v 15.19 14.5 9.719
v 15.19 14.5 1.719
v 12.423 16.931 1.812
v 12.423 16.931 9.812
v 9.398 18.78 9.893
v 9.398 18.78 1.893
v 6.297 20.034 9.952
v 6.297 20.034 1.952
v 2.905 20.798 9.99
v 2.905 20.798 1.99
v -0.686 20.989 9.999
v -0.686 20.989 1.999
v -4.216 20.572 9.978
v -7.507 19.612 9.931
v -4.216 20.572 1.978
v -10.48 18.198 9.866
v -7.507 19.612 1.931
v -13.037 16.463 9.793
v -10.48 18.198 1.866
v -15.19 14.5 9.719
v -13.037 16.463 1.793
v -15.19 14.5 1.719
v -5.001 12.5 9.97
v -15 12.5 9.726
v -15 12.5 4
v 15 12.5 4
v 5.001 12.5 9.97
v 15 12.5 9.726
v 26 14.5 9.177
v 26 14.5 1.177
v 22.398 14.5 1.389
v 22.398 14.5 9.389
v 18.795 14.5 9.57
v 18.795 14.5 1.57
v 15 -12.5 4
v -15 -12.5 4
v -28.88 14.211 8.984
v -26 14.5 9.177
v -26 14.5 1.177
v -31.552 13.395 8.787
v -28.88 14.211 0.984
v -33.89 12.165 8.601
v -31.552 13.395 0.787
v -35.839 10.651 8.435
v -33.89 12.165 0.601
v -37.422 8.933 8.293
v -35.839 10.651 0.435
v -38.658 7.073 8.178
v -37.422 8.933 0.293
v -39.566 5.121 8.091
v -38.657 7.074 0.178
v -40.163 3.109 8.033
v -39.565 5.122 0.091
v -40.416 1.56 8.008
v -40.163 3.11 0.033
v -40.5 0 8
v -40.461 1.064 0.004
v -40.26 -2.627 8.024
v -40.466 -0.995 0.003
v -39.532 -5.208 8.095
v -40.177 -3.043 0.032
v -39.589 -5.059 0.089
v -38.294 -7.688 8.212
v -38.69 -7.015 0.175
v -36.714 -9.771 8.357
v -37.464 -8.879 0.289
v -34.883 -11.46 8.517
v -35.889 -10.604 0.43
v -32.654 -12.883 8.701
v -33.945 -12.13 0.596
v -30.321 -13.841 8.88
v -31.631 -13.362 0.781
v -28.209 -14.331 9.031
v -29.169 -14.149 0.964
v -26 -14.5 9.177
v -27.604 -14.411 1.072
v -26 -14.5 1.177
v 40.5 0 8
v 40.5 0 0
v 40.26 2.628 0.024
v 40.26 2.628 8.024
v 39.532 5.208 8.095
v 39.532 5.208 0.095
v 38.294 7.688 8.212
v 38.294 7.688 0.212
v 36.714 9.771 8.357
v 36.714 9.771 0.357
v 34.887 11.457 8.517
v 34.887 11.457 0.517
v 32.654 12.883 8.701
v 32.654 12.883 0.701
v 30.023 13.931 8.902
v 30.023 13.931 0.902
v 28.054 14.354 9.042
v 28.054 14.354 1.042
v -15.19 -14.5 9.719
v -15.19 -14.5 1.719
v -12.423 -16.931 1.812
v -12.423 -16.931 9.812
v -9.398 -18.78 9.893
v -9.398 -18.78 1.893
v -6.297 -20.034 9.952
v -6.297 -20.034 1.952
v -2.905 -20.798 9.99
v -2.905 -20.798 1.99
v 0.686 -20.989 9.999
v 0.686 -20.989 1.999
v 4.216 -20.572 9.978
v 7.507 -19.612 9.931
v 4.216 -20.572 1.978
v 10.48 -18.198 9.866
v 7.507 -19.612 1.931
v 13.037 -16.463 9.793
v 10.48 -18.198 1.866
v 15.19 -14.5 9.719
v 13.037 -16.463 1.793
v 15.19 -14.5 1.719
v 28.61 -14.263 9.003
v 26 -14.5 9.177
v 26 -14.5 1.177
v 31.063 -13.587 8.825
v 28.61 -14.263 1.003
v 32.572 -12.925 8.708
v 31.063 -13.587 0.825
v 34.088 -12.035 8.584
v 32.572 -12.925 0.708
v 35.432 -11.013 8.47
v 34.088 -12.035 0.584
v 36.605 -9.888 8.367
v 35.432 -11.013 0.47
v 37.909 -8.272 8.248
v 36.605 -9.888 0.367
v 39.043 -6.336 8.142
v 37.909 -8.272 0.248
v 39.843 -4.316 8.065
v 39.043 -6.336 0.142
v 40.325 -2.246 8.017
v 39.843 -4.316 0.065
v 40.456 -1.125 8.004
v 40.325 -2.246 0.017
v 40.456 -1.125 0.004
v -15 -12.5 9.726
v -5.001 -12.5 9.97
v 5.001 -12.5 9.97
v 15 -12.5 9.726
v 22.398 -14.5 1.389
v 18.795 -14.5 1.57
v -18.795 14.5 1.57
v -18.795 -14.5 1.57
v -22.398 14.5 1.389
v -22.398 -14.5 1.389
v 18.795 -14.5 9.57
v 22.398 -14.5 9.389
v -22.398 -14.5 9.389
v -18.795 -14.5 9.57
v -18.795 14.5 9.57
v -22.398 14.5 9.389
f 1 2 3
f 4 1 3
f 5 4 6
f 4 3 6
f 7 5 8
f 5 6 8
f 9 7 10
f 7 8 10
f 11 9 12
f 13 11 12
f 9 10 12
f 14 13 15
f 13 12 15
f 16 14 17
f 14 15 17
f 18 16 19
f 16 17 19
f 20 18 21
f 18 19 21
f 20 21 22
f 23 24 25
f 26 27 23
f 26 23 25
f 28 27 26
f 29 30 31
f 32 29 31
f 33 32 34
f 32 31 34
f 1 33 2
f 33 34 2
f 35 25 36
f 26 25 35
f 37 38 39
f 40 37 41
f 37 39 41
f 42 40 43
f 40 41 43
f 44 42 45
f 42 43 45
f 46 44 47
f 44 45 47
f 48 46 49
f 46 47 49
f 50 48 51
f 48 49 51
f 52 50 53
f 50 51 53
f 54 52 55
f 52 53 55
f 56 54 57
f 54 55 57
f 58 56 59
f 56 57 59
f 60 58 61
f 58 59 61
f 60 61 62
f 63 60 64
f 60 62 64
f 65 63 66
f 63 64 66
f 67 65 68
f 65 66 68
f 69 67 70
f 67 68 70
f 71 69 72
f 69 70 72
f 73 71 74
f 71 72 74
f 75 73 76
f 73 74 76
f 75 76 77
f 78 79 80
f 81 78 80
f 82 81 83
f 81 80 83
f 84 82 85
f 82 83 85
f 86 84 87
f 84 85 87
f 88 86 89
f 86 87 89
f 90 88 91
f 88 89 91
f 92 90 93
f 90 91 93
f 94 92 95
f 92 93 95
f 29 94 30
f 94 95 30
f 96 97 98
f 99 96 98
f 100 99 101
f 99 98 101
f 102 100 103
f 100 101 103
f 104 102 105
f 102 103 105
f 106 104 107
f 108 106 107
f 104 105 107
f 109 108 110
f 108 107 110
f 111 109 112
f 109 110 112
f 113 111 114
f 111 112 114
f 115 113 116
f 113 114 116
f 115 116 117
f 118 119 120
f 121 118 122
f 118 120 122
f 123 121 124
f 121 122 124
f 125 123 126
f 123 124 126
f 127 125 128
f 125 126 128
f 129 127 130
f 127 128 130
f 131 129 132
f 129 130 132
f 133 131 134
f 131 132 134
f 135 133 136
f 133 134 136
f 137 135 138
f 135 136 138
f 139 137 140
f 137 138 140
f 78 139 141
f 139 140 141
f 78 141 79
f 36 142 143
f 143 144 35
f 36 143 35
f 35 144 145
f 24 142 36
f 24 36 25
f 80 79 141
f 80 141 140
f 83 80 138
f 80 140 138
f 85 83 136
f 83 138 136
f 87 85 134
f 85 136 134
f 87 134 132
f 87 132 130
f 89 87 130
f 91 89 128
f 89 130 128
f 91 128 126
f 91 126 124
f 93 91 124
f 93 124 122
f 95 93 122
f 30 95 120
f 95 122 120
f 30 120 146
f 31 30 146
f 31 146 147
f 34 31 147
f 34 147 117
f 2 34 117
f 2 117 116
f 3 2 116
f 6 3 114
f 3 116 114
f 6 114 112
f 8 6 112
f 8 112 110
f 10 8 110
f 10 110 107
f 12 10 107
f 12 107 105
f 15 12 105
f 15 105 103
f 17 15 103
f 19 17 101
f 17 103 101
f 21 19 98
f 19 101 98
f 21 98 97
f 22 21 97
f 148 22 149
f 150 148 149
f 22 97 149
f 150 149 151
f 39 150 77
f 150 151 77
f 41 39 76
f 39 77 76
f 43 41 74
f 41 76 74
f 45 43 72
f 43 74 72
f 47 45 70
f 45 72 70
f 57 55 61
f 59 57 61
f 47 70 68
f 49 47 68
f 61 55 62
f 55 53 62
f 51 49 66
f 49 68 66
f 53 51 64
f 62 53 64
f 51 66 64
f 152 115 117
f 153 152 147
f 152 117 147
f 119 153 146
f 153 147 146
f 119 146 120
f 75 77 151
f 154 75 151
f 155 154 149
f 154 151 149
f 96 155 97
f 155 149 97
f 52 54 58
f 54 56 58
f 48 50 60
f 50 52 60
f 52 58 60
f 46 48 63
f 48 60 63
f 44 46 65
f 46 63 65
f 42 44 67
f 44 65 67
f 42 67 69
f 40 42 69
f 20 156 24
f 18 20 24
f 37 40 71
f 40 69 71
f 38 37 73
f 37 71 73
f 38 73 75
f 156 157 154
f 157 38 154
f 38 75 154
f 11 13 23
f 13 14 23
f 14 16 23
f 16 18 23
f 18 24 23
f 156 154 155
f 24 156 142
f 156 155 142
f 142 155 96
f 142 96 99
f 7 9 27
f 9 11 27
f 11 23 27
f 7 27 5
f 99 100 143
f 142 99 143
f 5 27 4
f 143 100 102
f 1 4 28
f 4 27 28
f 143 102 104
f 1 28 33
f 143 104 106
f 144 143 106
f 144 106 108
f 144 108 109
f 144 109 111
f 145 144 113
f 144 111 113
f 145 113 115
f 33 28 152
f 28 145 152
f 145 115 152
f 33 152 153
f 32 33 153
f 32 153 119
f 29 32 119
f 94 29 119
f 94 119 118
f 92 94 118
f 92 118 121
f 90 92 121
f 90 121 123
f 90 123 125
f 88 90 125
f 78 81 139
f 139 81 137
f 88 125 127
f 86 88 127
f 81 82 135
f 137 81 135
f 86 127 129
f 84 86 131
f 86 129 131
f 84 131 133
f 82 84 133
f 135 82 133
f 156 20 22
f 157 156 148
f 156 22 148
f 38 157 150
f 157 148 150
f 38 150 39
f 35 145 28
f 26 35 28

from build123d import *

# Parameters (mm, degrees)
F1_DEPTH = 10
F3_R     = 411.0625
F4_DEPTH = 50
F2_W     = 30
F2_H     = 25
F5_DEPTH = 6
F7_DEPTH = 50


with BuildPart() as f1:
    # F0 (on Top) → F1 (new body)
    with BuildSketch(Plane.XY):
        with BuildLine():
            ThreePointArc((17.4375, 11.7018628325), (16.3738601454, 13.1490191245), (15.190457531, 14.5))
            ThreePointArc((15.190457531, 14.5), (0, 21), (-15.190457531, 14.5))
            ThreePointArc((-15.190457531, 14.5), (-16.3738601454, 13.1490191245), (-17.4375, 11.7018628325))
            ThreePointArc((-17.4375, 11.7018628325), (-13.0692952628, 6.561011736), (-11.5, 0))
            ThreePointArc((-11.5, 0), (-13.0692952628, -6.561011736), (-17.4375, -11.7018628325))
            ThreePointArc((-17.4375, -11.7018628325), (-16.3738601454, -13.1490191245), (-15.190457531, -14.5))
            ThreePointArc((-15.190457531, -14.5), (0, -21), (15.190457531, -14.5))
            ThreePointArc((15.190457531, -14.5), (16.3738601454, -13.1490191245), (17.4375, -11.7018628325))
            ThreePointArc((17.4375, -11.7018628325), (11.5, 0), (17.4375, 11.7018628325))
        make_face()
        with BuildLine():
            Line((26, 14.5), (15.190457531, 14.5))
            ThreePointArc((15.190457531, 14.5), (16.3738601454, 13.1490191245), (17.4375, 11.7018628325))
            ThreePointArc((17.4375, 11.7018628325), (21.4959468848, 13.7827248952), (26, 14.5))
        make_face()
        with BuildLine():
            ThreePointArc((-17.4375, 11.7018628325), (-16.3738601454, 13.1490191245), (-15.190457531, 14.5))
            Line((-15.190457531, 14.5), (-26, 14.5))
            ThreePointArc((-26, 14.5), (-21.4959468848, 13.7827248952), (-17.4375, 11.7018628325))
        make_face()
        with BuildLine():
            ThreePointArc((26, 14.5), (21.4959468848, 13.7827248952), (17.4375, 11.7018628325))
            ThreePointArc((17.4375, 11.7018628325), (20.089642854, 6.1160649114), (21, 0))
            ThreePointArc((21, 0), (20.089642854, -6.1160649114), (17.4375, -11.7018628325))
            ThreePointArc((17.4375, -11.7018628325), (21.4959468848, -13.7827248952), (26, -14.5))
            ThreePointArc((26, -14.5), (36.2530483272, -10.2530483272), (40.5, 0))
            ThreePointArc((40.5, 0), (36.2530483272, 10.2530483272), (26, 14.5))
        make_face()
        with BuildLine():
            ThreePointArc((-17.4375, -11.7018628325), (-21, 0), (-17.4375, 11.7018628325))
            ThreePointArc((-17.4375, 11.7018628325), (-21.4959468848, 13.7827248952), (-26, 14.5))
            ThreePointArc((-26, 14.5), (-40.5, 0), (-26, -14.5))
            ThreePointArc((-26, -14.5), (-21.4959468848, -13.7827248952), (-17.4375, -11.7018628325))
        make_face()
        with BuildLine():
            ThreePointArc((26, -14.5), (21.4959468848, -13.7827248952), (17.4375, -11.7018628325))
            ThreePointArc((17.4375, -11.7018628325), (16.3738601454, -13.1490191245), (15.190457531, -14.5))
            Line((15.190457531, -14.5), (26, -14.5))
        make_face()
        with BuildLine():
            ThreePointArc((-15.190457531, -14.5), (-16.3738601454, -13.1490191245), (-17.4375, -11.7018628325))
            ThreePointArc((-17.4375, -11.7018628325), (-21.4959468848, -13.7827248952), (-26, -14.5))
            Line((-26, -14.5), (-15.190457531, -14.5))
        make_face()
        with BuildLine():
            ThreePointArc((-11.5, 0), (-13.0692952628, 6.561011736), (-17.4375, 11.7018628325))
            ThreePointArc((-17.4375, 11.7018628325), (-21, 0), (-17.4375, -11.7018628325))
            ThreePointArc((-17.4375, -11.7018628325), (-13.0692952628, -6.561011736), (-11.5, 0))
        make_face()
        with BuildLine():
            ThreePointArc((21, 0), (20.089642854, 6.1160649114), (17.4375, 11.7018628325))
            ThreePointArc((17.4375, 11.7018628325), (11.5, 0), (17.4375, -11.7018628325))
            ThreePointArc((17.4375, -11.7018628325), (20.089642854, -6.1160649114), (21, 0))
        make_face()
    extrude(amount=F1_DEPTH)

    # F3 (on Front) → F4 (cut, symmetric)
    with BuildSketch(Plane.XZ):
        with Locations((0, -409.0625)):
            Circle(F3_R)
    extrude(amount=F4_DEPTH, both=True, mode=Mode.SUBTRACT)

    # F2 (on face) → F5 (cut)
    with BuildSketch(Plane.XY.offset(10)):
        Rectangle(F2_W, F2_H)
    extrude(amount=-F5_DEPTH, mode=Mode.SUBTRACT)

    # F6 (on Front) → F7 (cut, symmetric)
    with BuildSketch(Plane.XZ):
        with BuildLine():
            ThreePointArc((-40.5, 8), (0, 10), (40.5, 8))
            Line((40.5, 8), (40.5, 38))
            Line((40.5, 38), (-40.5, 38))
            Line((-40.5, 38), (-40.5, 8))
        make_face()
    extrude(amount=F7_DEPTH, both=True, mode=Mode.SUBTRACT)


solid = f1.part
